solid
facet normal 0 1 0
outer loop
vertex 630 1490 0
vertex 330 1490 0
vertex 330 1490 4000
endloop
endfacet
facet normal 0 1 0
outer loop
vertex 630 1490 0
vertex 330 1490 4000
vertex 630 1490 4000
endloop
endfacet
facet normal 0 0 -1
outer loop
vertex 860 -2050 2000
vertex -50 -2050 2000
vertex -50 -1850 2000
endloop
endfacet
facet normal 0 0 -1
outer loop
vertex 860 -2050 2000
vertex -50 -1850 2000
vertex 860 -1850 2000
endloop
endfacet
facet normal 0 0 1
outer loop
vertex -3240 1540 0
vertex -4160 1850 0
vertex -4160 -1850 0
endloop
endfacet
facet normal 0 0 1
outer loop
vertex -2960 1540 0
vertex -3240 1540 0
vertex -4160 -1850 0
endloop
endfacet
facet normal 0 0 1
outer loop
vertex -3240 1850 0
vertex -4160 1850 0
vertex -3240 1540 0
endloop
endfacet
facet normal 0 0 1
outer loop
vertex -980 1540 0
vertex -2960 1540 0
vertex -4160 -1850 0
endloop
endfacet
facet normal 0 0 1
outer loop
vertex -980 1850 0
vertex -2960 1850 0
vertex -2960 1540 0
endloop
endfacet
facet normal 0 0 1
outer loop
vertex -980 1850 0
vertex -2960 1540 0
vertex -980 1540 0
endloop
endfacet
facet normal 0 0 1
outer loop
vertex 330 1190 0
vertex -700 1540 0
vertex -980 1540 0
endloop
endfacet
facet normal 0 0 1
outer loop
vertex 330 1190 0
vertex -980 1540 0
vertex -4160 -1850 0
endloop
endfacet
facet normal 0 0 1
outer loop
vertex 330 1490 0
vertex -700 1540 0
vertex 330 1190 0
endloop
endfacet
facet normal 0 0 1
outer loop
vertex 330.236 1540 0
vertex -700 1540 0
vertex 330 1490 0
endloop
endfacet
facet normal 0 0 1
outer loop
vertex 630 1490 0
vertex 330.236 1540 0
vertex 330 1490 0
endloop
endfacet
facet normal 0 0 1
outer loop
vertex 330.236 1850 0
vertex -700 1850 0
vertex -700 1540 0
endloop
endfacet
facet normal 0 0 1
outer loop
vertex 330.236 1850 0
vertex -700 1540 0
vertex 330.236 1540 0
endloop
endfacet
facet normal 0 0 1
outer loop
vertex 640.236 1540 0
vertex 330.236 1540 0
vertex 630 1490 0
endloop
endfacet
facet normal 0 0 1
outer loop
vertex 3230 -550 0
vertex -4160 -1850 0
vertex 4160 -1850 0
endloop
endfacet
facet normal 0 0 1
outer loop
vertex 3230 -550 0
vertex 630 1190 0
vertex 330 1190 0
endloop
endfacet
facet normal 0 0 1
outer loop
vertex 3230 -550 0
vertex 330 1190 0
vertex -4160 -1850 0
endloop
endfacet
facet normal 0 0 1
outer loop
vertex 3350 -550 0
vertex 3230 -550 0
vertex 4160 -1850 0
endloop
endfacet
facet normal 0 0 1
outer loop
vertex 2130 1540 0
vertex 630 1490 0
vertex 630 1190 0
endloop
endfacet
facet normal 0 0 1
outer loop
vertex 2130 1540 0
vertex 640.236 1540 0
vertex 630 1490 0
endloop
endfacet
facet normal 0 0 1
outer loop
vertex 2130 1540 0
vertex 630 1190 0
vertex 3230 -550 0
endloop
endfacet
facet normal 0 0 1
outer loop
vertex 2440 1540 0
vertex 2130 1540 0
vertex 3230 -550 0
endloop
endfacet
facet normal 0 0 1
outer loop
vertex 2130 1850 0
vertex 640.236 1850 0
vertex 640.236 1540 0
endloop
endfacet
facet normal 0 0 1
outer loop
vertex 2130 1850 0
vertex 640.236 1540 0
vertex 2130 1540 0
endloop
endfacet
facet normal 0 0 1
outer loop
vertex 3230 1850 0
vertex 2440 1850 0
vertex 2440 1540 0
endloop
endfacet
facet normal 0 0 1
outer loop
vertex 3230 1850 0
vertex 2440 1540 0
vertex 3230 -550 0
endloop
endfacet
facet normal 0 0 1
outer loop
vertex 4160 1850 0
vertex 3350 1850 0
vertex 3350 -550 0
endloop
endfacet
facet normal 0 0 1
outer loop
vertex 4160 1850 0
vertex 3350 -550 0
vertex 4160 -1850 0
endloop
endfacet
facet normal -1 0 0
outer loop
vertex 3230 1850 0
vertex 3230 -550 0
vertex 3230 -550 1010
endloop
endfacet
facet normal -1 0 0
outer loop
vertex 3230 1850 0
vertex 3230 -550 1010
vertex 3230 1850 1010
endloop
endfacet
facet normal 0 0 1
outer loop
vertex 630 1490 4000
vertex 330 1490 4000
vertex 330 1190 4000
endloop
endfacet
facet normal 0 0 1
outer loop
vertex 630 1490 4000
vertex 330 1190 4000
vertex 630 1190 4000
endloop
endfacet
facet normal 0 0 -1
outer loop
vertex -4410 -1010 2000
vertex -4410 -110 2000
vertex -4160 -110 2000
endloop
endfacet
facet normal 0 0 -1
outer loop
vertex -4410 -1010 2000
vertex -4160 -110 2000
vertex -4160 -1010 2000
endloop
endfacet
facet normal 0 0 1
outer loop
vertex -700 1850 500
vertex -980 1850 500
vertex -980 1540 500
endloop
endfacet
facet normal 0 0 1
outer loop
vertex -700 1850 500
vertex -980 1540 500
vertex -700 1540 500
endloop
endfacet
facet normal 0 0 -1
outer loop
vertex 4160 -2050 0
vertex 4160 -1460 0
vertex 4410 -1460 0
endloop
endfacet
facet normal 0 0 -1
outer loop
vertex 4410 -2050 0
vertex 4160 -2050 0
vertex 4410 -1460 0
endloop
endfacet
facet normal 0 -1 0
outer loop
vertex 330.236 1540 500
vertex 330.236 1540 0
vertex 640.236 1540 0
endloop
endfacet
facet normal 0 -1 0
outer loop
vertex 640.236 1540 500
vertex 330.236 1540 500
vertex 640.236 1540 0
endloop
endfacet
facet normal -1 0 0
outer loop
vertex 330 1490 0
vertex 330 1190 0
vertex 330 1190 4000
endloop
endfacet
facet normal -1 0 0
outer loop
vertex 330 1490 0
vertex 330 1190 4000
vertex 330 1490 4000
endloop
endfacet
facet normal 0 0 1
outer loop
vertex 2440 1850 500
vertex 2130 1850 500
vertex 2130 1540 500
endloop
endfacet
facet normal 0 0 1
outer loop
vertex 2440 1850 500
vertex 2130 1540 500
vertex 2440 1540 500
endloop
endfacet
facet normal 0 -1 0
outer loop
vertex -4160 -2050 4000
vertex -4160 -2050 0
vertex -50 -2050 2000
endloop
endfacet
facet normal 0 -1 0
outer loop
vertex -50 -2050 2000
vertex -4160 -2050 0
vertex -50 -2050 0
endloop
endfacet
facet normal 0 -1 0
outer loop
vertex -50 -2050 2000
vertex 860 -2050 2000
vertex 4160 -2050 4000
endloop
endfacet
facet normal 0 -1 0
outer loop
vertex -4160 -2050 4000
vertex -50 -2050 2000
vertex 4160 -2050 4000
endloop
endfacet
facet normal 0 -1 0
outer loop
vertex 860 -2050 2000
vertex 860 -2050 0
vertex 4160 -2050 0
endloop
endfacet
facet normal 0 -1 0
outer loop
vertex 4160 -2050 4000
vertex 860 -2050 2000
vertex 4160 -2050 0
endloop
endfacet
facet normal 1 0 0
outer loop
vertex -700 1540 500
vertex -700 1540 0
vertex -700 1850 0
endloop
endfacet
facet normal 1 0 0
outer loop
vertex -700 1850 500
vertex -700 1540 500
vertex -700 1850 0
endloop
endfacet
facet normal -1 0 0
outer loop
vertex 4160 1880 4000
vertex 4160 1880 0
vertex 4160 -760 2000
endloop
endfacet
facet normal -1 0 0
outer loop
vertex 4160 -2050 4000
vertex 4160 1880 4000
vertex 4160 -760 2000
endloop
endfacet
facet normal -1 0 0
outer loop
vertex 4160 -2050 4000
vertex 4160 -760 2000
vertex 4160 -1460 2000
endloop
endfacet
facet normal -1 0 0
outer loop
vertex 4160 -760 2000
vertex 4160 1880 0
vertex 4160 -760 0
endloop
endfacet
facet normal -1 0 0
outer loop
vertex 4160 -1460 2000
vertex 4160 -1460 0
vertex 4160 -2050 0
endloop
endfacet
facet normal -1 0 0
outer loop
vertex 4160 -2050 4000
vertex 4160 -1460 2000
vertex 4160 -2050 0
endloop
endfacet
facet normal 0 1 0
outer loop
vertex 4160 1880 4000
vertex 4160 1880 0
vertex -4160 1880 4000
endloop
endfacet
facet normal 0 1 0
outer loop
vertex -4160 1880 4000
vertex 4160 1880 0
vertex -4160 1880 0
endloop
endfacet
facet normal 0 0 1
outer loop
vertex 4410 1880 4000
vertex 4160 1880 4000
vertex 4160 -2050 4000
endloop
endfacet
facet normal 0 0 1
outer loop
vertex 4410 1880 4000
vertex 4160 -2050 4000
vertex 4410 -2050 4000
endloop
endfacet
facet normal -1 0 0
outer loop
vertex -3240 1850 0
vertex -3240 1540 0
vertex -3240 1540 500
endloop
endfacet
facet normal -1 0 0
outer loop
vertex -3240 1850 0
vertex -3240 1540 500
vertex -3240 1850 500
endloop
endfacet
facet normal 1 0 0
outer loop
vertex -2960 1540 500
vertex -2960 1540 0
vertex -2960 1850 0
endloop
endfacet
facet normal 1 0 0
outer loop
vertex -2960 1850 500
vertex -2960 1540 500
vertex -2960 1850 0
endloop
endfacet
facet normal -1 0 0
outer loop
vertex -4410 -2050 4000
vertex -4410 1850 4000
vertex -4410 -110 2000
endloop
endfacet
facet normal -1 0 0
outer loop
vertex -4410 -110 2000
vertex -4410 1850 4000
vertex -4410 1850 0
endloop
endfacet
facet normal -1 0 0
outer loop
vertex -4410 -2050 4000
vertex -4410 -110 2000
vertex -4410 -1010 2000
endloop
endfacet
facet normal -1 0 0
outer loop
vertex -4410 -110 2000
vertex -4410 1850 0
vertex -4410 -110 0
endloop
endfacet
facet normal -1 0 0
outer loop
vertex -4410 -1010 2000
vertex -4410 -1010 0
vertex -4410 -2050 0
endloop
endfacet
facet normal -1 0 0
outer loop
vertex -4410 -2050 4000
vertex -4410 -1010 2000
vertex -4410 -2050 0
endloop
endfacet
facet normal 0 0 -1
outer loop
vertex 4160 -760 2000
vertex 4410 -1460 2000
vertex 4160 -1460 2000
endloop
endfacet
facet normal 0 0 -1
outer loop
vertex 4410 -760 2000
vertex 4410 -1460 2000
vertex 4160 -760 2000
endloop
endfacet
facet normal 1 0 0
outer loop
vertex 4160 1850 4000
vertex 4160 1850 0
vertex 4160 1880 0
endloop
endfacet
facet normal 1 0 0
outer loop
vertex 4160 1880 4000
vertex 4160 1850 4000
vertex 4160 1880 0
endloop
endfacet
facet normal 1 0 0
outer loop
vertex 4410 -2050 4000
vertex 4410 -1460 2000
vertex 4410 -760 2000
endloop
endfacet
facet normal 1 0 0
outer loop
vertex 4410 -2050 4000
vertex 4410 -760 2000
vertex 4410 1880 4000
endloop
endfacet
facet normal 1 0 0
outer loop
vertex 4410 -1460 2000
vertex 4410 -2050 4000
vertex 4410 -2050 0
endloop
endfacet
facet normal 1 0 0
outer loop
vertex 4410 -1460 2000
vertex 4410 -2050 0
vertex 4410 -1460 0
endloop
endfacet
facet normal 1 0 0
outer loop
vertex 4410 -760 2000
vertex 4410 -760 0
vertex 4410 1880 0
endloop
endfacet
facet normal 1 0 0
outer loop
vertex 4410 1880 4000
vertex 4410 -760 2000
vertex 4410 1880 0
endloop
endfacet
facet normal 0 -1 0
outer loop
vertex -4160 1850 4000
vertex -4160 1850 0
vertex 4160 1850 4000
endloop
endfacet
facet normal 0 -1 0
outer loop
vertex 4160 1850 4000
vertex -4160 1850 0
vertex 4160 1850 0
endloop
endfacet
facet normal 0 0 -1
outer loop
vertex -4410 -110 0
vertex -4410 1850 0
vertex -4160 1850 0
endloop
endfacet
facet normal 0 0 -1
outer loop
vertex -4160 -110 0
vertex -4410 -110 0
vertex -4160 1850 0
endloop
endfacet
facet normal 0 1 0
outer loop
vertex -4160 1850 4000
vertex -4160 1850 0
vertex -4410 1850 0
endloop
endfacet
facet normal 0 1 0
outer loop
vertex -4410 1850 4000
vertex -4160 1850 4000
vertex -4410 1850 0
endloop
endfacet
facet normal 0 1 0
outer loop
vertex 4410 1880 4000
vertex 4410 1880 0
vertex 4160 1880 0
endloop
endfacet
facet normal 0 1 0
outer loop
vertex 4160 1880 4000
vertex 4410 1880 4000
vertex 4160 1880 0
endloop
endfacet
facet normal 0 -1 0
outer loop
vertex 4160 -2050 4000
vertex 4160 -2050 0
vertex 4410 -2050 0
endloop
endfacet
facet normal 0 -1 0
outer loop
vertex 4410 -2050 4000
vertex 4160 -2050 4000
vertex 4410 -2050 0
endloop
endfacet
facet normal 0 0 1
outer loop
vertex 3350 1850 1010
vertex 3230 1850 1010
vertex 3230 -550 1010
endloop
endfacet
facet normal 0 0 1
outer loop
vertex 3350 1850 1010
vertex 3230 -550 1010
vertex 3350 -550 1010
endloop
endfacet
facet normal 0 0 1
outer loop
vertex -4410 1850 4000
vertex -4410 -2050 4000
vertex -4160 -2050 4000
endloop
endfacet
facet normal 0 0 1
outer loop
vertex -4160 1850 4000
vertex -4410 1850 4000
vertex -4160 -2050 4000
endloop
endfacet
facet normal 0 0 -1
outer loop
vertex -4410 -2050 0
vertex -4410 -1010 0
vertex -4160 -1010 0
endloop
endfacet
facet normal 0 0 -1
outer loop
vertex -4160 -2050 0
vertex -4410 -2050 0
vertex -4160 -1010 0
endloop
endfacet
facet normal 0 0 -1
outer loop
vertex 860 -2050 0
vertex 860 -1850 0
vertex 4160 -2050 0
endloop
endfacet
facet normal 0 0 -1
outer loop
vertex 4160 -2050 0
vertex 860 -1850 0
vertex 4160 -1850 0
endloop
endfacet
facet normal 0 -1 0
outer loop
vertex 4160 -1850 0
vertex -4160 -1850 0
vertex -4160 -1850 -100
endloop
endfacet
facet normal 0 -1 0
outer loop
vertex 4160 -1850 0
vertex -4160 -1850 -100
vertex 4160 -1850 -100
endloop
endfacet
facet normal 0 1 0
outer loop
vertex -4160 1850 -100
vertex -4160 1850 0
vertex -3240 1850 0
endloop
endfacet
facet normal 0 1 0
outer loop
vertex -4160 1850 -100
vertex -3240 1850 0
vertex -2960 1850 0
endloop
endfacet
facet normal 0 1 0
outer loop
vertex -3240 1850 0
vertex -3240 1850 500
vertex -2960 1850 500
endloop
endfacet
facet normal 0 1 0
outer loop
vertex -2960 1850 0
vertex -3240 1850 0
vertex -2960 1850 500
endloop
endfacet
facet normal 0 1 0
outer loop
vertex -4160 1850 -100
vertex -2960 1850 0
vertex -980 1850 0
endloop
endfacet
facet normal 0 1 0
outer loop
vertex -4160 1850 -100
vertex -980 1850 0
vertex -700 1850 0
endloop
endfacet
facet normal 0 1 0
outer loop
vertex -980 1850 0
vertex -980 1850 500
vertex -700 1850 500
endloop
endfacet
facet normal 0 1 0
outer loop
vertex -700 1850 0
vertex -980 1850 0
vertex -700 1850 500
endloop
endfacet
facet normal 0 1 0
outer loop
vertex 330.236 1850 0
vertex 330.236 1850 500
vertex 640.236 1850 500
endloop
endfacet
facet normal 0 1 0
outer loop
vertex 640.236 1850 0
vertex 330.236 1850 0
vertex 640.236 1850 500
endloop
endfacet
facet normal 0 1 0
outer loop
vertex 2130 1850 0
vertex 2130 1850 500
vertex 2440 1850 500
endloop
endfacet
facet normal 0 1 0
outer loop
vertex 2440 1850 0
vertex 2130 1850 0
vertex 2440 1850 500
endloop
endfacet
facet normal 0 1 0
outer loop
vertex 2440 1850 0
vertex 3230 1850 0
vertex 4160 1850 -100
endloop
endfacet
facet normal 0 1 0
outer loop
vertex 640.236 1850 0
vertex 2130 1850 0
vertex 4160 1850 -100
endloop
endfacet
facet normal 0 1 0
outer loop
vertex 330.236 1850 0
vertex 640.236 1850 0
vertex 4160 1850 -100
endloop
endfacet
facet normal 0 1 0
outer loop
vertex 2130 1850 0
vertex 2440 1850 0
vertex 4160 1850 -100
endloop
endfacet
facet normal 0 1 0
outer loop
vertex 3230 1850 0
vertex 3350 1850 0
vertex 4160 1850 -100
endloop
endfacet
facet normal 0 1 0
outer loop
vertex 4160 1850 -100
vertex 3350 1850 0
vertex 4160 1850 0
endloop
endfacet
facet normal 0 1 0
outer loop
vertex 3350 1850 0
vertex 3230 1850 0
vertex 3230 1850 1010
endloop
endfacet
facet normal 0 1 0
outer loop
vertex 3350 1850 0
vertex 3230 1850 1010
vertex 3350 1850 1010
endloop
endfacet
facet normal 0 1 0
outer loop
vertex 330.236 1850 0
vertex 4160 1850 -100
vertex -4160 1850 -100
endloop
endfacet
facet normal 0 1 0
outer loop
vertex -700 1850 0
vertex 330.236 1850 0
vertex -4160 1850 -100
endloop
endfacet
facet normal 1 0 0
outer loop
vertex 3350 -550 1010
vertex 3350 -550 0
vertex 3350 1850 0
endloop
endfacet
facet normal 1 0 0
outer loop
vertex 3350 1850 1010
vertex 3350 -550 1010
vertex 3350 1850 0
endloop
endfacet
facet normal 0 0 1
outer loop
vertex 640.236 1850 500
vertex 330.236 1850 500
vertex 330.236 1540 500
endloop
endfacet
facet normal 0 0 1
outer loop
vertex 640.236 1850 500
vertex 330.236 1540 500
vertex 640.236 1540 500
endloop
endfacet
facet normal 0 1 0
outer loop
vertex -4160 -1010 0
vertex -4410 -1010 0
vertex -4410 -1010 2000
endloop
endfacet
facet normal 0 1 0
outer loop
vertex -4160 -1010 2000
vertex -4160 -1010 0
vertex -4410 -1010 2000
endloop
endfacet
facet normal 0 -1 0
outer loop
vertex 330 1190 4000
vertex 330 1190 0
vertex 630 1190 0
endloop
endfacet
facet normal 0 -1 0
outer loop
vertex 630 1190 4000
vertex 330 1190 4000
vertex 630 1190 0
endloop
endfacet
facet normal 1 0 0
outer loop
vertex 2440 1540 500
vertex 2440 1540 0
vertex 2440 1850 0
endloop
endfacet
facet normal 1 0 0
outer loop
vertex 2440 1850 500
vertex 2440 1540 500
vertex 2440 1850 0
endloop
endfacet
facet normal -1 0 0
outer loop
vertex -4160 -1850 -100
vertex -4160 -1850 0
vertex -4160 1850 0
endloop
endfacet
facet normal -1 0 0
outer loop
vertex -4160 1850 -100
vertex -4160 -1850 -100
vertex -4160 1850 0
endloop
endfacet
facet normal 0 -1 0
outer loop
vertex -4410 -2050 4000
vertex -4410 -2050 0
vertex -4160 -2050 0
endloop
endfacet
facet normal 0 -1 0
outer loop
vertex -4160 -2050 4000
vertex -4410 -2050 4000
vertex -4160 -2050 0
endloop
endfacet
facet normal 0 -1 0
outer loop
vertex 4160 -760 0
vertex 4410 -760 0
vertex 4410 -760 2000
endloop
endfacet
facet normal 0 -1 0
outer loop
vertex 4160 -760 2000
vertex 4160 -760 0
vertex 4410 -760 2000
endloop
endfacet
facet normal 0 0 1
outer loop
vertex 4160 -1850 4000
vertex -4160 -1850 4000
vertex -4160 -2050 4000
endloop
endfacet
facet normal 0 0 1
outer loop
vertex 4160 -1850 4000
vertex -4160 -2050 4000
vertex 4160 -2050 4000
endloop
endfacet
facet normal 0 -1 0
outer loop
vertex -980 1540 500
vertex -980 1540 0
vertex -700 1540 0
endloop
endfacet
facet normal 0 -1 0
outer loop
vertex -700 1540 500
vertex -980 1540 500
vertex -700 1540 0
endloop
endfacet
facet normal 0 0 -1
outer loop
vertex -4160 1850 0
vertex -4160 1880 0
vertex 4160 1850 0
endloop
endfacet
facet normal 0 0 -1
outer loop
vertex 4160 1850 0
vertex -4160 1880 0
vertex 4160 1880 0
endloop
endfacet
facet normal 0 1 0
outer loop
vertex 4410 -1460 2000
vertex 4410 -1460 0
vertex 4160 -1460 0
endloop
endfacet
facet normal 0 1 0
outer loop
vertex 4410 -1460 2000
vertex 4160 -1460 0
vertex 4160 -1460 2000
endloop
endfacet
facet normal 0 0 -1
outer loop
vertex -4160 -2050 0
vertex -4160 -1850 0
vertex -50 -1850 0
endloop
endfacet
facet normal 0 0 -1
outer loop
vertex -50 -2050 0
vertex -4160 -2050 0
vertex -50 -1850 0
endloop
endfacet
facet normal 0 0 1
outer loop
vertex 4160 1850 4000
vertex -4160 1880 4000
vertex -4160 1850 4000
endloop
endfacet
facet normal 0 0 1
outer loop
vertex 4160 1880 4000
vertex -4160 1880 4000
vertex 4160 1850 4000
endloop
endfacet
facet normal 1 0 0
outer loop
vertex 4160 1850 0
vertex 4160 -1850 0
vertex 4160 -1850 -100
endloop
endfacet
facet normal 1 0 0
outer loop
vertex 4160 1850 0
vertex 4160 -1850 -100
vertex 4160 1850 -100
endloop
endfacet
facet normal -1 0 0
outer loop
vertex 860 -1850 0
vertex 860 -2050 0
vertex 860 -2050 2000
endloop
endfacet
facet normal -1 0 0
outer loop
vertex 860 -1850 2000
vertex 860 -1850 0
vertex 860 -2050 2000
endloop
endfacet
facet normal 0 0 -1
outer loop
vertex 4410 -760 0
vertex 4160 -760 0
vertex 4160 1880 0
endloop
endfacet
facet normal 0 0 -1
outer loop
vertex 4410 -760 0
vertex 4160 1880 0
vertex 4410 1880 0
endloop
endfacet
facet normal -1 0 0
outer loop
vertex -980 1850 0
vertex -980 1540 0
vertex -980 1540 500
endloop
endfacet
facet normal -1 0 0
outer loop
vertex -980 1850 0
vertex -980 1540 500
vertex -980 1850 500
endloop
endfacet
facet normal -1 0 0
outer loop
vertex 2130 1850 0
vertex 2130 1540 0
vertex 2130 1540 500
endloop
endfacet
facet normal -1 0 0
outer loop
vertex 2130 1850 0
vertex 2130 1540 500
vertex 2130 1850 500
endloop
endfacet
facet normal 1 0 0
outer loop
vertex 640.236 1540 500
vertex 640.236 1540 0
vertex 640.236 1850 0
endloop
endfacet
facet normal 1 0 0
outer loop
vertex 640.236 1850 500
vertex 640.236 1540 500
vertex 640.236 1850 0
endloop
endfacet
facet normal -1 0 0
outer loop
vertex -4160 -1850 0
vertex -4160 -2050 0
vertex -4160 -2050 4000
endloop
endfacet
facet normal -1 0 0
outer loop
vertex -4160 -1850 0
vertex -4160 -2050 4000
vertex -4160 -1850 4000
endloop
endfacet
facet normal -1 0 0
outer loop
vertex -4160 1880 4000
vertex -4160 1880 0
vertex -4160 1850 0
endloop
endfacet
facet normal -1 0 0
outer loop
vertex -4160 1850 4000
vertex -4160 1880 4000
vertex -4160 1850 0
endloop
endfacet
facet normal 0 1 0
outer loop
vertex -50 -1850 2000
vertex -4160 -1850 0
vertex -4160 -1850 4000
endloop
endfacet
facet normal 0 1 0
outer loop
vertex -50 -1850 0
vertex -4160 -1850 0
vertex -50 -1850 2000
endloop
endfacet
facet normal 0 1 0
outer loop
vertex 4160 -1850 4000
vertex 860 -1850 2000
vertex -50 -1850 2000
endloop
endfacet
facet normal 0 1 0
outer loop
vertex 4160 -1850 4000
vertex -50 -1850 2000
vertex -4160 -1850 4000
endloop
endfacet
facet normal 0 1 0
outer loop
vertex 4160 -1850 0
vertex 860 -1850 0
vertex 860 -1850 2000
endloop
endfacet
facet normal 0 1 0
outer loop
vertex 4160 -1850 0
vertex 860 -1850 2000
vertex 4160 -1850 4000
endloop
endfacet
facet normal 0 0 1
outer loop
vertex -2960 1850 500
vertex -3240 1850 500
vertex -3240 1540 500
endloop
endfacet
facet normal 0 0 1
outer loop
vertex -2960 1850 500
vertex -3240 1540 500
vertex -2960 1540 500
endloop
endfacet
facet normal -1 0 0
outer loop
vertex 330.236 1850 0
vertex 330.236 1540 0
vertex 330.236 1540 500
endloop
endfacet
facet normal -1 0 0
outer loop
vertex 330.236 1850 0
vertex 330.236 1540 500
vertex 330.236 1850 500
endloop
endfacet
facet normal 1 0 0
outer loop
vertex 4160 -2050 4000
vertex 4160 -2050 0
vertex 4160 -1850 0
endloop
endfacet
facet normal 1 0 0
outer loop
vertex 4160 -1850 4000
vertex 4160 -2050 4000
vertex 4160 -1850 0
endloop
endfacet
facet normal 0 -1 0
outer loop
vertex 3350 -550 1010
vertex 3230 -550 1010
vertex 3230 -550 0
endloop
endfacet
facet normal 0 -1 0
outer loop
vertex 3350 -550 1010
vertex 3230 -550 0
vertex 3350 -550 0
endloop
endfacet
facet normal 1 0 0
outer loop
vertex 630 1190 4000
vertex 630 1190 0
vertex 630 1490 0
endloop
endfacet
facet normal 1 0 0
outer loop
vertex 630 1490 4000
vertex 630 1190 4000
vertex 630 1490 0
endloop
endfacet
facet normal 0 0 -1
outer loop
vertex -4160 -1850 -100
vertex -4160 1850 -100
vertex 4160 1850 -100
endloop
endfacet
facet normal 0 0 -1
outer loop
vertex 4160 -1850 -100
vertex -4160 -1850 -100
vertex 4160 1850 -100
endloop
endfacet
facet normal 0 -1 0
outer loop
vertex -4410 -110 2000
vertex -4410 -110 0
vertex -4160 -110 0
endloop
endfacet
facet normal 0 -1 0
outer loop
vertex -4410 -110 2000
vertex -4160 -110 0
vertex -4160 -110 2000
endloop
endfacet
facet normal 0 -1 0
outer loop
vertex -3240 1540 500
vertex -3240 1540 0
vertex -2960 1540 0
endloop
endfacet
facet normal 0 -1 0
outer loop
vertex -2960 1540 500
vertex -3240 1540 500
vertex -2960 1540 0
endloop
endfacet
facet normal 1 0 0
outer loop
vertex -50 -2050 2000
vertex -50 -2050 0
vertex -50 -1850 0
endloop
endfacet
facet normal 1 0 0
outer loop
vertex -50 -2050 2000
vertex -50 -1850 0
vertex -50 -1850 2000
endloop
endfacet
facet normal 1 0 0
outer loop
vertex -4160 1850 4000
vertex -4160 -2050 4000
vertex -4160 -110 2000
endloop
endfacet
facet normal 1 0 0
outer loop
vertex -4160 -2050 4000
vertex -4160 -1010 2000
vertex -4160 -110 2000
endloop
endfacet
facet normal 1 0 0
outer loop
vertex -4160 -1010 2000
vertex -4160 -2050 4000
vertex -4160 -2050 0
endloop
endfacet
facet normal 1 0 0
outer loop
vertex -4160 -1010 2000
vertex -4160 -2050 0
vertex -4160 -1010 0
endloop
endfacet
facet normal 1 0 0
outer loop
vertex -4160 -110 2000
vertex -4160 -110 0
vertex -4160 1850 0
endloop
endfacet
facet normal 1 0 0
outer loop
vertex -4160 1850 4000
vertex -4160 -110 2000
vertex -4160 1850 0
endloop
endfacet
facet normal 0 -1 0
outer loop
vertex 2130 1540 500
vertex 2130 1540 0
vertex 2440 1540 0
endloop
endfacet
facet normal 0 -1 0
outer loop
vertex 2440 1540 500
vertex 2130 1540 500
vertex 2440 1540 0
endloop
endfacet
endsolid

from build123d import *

# Parameters (mm, degrees)
F1_W      = 8320
F1_H      = 3700
F2_DEPTH  = 100
F3_W      = 300
F3_H      = 300
F4_DEPTH  = 4000
F3_W_2    = 280
F3_H_2    = 310
F3_W_3    = 310
F5_DEPTH  = 500
F3_W_4    = 120
F3_H_3    = 2400
F6_DEPTH  = 1010
F8_DEPTH  = 4000
F9_DEPTH  = 4000
F10_DEPTH = 4000
F7_W      = 8320
F7_H      = 200
F11_DEPTH = 4000
F12_W     = 700
F12_H     = 2000
F13_DEPTH = 8820.001
F14_W     = 900
F14_H     = 2000
F15_DEPTH = 8820.001
F16_W     = 910
F16_H     = 2000
F17_DEPTH = 3930.001


with BuildPart() as f2:
    # F1 (on Top) → F2 (new body)
    with BuildSketch(Plane.XY):
        Rectangle(F1_W, F1_H)
    extrude(amount=-F2_DEPTH)

    # F3 (on face) → F4 (join)
    with BuildSketch(Plane.XY):
        with Locations((480, 1340)):
            Rectangle(F3_W, F3_H)
    extrude(amount=F4_DEPTH)

    # F3 (on face) → F5 (join)
    with BuildSketch(Plane.XY):
        with Locations((-3100, 1695)):
            Rectangle(F3_W_2, F3_H_2)
        with Locations((-840, 1695)):
            Rectangle(F3_W_2, F3_H_2)
        with Locations((2285, 1695)):
            Rectangle(F3_W_3, F3_H_2)
        with Locations((485.2361369133, 1695)):
            Rectangle(F3_W_3, F3_H_2)
    extrude(amount=F5_DEPTH)

    # F3 (on face) → F6 (join)
    with BuildSketch(Plane.XY):
        with Locations((3290, 650)):
            Rectangle(F3_W_4, F3_H_3)
    extrude(amount=F6_DEPTH)


with BuildPart() as f8:
    # F7 (on face) → F8 (new body)
    with BuildSketch(Plane.XY):
        Polygon((-4160, 1880), (-4160, 1850), (-3240, 1850), (-2960, 1850), (-980, 1850), (-700, 1850), (330.2361369133, 1850), (640.2361369133, 1850), (2130, 1850), (2440, 1850), (3230, 1850), (3350, 1850), (4160, 1850), (4160, 1880), align=None)
    extrude(amount=F8_DEPTH)


with BuildPart() as f9:
    # F7 (on face) → F9 (new body)
    with BuildSketch(Plane.XY):
        Polygon((4410, 1880), (4160, 1880), (4160, 1850), (4160, -1850), (4160, -2050), (4410, -2050), align=None)
    extrude(amount=F9_DEPTH)

    # F12 (on face) → F13 (cut, through all)
    with BuildSketch(Plane.YZ.offset(4410)):
        with Locations((-1110, 1000)):
            Rectangle(F12_W, F12_H)
    extrude(amount=-F13_DEPTH, mode=Mode.SUBTRACT)


with BuildPart() as f10:
    # F7 (on face) → F10 (new body)
    with BuildSketch(Plane.XY):
        Polygon((-4160, -1850), (-4160, 1850), (-4410, 1850), (-4410, -2050), (-4160, -2050), align=None)
    extrude(amount=F10_DEPTH)

    # F14 (on face) → F15 (cut, through all)
    with BuildSketch(Plane(origin=(-4410, 0, 0), x_dir=(0, -1, 0), z_dir=(-1, 0, 0))):
        with Locations((560, 1000)):
            Rectangle(F14_W, F14_H)
    extrude(amount=-F15_DEPTH, mode=Mode.SUBTRACT)


with BuildPart() as f11:
    # F7 (on face) → F11 (new body)
    with BuildSketch(Plane.XY):
        with Locations((0, -1950)):
            Rectangle(F7_W, F7_H)
    extrude(amount=F11_DEPTH)

    # F16 (on face) → F17 (cut, through all)
    with BuildSketch(Plane.XZ.offset(2050)):
        with Locations((405, 1000)):
            Rectangle(F16_W, F16_H)
    extrude(amount=-F17_DEPTH, mode=Mode.SUBTRACT)


solid = Compound([f2.part, f8.part, f9.part, f10.part, f11.part])
